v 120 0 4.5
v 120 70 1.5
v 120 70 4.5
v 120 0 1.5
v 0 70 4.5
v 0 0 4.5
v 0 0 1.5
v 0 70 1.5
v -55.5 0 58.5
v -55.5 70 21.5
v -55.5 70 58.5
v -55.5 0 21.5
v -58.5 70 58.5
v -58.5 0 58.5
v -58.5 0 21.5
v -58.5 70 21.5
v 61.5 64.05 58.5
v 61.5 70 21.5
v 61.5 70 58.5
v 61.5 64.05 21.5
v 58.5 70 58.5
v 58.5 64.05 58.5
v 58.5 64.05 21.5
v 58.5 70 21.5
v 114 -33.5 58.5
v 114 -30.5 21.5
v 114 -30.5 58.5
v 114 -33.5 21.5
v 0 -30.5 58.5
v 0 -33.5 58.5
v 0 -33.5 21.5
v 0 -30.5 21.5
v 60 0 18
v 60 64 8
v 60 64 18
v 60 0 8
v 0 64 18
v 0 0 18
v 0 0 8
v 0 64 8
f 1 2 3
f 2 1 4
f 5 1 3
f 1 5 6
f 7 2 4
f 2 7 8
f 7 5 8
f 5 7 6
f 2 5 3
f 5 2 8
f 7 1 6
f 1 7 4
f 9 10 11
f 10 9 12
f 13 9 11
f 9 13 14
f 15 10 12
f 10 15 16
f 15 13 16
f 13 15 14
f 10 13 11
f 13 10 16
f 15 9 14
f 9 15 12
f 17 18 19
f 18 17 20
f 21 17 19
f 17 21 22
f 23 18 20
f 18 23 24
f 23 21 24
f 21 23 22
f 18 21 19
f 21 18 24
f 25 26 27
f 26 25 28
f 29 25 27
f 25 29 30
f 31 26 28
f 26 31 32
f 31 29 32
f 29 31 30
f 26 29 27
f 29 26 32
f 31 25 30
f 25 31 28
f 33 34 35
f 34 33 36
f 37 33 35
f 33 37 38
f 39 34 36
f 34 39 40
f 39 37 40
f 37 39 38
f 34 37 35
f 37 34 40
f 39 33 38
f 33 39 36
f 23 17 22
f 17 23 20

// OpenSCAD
// Buffer tank for mini horizontal gel-electrophoresis box
outer_x = 120;
outer_y = 70;
outer_z = 40;
wall_thick = 3;
floor_thick = 3;
platform_x = 60;
platform_y = outer_y - 2*wall_thick;
platform_z_bottom = floor_thick;
platform_z_top = 13;
platform_h = platform_z_top - platform_z_bottom;
hole_diam = 2;
hole_y = 0;
hole_z = 30;
inner_x = outer_x - 2*wall_thick;
inner_y = platform_y;
inner_z = outer_z - floor_thick;

$fn = 64;

difference() {
    union() {
        // Floor
        translate([0, 0, floor_thick/2]) cube([outer_x, outer_y, floor_thick]);
        // Walls
        walls_z_center = floor_thick + inner_z/2;
        // Left
        translate([-outer_x/2 + wall_thick/2, 0, walls_z_center]) cube([wall_thick, outer_y, inner_z]);
        // Right
        translate([outer_x/2 - wall_thick/2, 0, walls_z_center]) cube([wall_thick, outer_y, inner_z]);
        // Front
        translate([0, -outer_y/2 + wall_thick/2, walls_z_center]) cube([inner_x, wall_thick, inner_z]);
        // Back
        translate([0, outer_y/2 - wall_thick/2, walls_z_center]) cube([inner_x, wall_thick, inner_z]);
        // Platform
        translate([0, 0, platform_z_bottom + platform_h/2]) cube([platform_x, platform_y, platform_h]);
    }
    // Inner cavity (extends 0.05 mm past faces to avoid coplanar edges)
    translate([0, 0, floor_thick + inner_z/2]) cube([inner_x + 0.05, inner_y + 0.05, inner_z + 0.05]);
    // Electrode wire holes (extend 1 mm past walls)
    rotate([0, 90, 0]) cylinder(d=hole_diam, h=outer_x + 2, center=true);
}
// Platform was removed by cavity subtraction; add it back to preserve the solid block
translate([0, 0, platform_z_bottom + platform_h/2]) cube([platform_x, platform_y, platform_h]);
